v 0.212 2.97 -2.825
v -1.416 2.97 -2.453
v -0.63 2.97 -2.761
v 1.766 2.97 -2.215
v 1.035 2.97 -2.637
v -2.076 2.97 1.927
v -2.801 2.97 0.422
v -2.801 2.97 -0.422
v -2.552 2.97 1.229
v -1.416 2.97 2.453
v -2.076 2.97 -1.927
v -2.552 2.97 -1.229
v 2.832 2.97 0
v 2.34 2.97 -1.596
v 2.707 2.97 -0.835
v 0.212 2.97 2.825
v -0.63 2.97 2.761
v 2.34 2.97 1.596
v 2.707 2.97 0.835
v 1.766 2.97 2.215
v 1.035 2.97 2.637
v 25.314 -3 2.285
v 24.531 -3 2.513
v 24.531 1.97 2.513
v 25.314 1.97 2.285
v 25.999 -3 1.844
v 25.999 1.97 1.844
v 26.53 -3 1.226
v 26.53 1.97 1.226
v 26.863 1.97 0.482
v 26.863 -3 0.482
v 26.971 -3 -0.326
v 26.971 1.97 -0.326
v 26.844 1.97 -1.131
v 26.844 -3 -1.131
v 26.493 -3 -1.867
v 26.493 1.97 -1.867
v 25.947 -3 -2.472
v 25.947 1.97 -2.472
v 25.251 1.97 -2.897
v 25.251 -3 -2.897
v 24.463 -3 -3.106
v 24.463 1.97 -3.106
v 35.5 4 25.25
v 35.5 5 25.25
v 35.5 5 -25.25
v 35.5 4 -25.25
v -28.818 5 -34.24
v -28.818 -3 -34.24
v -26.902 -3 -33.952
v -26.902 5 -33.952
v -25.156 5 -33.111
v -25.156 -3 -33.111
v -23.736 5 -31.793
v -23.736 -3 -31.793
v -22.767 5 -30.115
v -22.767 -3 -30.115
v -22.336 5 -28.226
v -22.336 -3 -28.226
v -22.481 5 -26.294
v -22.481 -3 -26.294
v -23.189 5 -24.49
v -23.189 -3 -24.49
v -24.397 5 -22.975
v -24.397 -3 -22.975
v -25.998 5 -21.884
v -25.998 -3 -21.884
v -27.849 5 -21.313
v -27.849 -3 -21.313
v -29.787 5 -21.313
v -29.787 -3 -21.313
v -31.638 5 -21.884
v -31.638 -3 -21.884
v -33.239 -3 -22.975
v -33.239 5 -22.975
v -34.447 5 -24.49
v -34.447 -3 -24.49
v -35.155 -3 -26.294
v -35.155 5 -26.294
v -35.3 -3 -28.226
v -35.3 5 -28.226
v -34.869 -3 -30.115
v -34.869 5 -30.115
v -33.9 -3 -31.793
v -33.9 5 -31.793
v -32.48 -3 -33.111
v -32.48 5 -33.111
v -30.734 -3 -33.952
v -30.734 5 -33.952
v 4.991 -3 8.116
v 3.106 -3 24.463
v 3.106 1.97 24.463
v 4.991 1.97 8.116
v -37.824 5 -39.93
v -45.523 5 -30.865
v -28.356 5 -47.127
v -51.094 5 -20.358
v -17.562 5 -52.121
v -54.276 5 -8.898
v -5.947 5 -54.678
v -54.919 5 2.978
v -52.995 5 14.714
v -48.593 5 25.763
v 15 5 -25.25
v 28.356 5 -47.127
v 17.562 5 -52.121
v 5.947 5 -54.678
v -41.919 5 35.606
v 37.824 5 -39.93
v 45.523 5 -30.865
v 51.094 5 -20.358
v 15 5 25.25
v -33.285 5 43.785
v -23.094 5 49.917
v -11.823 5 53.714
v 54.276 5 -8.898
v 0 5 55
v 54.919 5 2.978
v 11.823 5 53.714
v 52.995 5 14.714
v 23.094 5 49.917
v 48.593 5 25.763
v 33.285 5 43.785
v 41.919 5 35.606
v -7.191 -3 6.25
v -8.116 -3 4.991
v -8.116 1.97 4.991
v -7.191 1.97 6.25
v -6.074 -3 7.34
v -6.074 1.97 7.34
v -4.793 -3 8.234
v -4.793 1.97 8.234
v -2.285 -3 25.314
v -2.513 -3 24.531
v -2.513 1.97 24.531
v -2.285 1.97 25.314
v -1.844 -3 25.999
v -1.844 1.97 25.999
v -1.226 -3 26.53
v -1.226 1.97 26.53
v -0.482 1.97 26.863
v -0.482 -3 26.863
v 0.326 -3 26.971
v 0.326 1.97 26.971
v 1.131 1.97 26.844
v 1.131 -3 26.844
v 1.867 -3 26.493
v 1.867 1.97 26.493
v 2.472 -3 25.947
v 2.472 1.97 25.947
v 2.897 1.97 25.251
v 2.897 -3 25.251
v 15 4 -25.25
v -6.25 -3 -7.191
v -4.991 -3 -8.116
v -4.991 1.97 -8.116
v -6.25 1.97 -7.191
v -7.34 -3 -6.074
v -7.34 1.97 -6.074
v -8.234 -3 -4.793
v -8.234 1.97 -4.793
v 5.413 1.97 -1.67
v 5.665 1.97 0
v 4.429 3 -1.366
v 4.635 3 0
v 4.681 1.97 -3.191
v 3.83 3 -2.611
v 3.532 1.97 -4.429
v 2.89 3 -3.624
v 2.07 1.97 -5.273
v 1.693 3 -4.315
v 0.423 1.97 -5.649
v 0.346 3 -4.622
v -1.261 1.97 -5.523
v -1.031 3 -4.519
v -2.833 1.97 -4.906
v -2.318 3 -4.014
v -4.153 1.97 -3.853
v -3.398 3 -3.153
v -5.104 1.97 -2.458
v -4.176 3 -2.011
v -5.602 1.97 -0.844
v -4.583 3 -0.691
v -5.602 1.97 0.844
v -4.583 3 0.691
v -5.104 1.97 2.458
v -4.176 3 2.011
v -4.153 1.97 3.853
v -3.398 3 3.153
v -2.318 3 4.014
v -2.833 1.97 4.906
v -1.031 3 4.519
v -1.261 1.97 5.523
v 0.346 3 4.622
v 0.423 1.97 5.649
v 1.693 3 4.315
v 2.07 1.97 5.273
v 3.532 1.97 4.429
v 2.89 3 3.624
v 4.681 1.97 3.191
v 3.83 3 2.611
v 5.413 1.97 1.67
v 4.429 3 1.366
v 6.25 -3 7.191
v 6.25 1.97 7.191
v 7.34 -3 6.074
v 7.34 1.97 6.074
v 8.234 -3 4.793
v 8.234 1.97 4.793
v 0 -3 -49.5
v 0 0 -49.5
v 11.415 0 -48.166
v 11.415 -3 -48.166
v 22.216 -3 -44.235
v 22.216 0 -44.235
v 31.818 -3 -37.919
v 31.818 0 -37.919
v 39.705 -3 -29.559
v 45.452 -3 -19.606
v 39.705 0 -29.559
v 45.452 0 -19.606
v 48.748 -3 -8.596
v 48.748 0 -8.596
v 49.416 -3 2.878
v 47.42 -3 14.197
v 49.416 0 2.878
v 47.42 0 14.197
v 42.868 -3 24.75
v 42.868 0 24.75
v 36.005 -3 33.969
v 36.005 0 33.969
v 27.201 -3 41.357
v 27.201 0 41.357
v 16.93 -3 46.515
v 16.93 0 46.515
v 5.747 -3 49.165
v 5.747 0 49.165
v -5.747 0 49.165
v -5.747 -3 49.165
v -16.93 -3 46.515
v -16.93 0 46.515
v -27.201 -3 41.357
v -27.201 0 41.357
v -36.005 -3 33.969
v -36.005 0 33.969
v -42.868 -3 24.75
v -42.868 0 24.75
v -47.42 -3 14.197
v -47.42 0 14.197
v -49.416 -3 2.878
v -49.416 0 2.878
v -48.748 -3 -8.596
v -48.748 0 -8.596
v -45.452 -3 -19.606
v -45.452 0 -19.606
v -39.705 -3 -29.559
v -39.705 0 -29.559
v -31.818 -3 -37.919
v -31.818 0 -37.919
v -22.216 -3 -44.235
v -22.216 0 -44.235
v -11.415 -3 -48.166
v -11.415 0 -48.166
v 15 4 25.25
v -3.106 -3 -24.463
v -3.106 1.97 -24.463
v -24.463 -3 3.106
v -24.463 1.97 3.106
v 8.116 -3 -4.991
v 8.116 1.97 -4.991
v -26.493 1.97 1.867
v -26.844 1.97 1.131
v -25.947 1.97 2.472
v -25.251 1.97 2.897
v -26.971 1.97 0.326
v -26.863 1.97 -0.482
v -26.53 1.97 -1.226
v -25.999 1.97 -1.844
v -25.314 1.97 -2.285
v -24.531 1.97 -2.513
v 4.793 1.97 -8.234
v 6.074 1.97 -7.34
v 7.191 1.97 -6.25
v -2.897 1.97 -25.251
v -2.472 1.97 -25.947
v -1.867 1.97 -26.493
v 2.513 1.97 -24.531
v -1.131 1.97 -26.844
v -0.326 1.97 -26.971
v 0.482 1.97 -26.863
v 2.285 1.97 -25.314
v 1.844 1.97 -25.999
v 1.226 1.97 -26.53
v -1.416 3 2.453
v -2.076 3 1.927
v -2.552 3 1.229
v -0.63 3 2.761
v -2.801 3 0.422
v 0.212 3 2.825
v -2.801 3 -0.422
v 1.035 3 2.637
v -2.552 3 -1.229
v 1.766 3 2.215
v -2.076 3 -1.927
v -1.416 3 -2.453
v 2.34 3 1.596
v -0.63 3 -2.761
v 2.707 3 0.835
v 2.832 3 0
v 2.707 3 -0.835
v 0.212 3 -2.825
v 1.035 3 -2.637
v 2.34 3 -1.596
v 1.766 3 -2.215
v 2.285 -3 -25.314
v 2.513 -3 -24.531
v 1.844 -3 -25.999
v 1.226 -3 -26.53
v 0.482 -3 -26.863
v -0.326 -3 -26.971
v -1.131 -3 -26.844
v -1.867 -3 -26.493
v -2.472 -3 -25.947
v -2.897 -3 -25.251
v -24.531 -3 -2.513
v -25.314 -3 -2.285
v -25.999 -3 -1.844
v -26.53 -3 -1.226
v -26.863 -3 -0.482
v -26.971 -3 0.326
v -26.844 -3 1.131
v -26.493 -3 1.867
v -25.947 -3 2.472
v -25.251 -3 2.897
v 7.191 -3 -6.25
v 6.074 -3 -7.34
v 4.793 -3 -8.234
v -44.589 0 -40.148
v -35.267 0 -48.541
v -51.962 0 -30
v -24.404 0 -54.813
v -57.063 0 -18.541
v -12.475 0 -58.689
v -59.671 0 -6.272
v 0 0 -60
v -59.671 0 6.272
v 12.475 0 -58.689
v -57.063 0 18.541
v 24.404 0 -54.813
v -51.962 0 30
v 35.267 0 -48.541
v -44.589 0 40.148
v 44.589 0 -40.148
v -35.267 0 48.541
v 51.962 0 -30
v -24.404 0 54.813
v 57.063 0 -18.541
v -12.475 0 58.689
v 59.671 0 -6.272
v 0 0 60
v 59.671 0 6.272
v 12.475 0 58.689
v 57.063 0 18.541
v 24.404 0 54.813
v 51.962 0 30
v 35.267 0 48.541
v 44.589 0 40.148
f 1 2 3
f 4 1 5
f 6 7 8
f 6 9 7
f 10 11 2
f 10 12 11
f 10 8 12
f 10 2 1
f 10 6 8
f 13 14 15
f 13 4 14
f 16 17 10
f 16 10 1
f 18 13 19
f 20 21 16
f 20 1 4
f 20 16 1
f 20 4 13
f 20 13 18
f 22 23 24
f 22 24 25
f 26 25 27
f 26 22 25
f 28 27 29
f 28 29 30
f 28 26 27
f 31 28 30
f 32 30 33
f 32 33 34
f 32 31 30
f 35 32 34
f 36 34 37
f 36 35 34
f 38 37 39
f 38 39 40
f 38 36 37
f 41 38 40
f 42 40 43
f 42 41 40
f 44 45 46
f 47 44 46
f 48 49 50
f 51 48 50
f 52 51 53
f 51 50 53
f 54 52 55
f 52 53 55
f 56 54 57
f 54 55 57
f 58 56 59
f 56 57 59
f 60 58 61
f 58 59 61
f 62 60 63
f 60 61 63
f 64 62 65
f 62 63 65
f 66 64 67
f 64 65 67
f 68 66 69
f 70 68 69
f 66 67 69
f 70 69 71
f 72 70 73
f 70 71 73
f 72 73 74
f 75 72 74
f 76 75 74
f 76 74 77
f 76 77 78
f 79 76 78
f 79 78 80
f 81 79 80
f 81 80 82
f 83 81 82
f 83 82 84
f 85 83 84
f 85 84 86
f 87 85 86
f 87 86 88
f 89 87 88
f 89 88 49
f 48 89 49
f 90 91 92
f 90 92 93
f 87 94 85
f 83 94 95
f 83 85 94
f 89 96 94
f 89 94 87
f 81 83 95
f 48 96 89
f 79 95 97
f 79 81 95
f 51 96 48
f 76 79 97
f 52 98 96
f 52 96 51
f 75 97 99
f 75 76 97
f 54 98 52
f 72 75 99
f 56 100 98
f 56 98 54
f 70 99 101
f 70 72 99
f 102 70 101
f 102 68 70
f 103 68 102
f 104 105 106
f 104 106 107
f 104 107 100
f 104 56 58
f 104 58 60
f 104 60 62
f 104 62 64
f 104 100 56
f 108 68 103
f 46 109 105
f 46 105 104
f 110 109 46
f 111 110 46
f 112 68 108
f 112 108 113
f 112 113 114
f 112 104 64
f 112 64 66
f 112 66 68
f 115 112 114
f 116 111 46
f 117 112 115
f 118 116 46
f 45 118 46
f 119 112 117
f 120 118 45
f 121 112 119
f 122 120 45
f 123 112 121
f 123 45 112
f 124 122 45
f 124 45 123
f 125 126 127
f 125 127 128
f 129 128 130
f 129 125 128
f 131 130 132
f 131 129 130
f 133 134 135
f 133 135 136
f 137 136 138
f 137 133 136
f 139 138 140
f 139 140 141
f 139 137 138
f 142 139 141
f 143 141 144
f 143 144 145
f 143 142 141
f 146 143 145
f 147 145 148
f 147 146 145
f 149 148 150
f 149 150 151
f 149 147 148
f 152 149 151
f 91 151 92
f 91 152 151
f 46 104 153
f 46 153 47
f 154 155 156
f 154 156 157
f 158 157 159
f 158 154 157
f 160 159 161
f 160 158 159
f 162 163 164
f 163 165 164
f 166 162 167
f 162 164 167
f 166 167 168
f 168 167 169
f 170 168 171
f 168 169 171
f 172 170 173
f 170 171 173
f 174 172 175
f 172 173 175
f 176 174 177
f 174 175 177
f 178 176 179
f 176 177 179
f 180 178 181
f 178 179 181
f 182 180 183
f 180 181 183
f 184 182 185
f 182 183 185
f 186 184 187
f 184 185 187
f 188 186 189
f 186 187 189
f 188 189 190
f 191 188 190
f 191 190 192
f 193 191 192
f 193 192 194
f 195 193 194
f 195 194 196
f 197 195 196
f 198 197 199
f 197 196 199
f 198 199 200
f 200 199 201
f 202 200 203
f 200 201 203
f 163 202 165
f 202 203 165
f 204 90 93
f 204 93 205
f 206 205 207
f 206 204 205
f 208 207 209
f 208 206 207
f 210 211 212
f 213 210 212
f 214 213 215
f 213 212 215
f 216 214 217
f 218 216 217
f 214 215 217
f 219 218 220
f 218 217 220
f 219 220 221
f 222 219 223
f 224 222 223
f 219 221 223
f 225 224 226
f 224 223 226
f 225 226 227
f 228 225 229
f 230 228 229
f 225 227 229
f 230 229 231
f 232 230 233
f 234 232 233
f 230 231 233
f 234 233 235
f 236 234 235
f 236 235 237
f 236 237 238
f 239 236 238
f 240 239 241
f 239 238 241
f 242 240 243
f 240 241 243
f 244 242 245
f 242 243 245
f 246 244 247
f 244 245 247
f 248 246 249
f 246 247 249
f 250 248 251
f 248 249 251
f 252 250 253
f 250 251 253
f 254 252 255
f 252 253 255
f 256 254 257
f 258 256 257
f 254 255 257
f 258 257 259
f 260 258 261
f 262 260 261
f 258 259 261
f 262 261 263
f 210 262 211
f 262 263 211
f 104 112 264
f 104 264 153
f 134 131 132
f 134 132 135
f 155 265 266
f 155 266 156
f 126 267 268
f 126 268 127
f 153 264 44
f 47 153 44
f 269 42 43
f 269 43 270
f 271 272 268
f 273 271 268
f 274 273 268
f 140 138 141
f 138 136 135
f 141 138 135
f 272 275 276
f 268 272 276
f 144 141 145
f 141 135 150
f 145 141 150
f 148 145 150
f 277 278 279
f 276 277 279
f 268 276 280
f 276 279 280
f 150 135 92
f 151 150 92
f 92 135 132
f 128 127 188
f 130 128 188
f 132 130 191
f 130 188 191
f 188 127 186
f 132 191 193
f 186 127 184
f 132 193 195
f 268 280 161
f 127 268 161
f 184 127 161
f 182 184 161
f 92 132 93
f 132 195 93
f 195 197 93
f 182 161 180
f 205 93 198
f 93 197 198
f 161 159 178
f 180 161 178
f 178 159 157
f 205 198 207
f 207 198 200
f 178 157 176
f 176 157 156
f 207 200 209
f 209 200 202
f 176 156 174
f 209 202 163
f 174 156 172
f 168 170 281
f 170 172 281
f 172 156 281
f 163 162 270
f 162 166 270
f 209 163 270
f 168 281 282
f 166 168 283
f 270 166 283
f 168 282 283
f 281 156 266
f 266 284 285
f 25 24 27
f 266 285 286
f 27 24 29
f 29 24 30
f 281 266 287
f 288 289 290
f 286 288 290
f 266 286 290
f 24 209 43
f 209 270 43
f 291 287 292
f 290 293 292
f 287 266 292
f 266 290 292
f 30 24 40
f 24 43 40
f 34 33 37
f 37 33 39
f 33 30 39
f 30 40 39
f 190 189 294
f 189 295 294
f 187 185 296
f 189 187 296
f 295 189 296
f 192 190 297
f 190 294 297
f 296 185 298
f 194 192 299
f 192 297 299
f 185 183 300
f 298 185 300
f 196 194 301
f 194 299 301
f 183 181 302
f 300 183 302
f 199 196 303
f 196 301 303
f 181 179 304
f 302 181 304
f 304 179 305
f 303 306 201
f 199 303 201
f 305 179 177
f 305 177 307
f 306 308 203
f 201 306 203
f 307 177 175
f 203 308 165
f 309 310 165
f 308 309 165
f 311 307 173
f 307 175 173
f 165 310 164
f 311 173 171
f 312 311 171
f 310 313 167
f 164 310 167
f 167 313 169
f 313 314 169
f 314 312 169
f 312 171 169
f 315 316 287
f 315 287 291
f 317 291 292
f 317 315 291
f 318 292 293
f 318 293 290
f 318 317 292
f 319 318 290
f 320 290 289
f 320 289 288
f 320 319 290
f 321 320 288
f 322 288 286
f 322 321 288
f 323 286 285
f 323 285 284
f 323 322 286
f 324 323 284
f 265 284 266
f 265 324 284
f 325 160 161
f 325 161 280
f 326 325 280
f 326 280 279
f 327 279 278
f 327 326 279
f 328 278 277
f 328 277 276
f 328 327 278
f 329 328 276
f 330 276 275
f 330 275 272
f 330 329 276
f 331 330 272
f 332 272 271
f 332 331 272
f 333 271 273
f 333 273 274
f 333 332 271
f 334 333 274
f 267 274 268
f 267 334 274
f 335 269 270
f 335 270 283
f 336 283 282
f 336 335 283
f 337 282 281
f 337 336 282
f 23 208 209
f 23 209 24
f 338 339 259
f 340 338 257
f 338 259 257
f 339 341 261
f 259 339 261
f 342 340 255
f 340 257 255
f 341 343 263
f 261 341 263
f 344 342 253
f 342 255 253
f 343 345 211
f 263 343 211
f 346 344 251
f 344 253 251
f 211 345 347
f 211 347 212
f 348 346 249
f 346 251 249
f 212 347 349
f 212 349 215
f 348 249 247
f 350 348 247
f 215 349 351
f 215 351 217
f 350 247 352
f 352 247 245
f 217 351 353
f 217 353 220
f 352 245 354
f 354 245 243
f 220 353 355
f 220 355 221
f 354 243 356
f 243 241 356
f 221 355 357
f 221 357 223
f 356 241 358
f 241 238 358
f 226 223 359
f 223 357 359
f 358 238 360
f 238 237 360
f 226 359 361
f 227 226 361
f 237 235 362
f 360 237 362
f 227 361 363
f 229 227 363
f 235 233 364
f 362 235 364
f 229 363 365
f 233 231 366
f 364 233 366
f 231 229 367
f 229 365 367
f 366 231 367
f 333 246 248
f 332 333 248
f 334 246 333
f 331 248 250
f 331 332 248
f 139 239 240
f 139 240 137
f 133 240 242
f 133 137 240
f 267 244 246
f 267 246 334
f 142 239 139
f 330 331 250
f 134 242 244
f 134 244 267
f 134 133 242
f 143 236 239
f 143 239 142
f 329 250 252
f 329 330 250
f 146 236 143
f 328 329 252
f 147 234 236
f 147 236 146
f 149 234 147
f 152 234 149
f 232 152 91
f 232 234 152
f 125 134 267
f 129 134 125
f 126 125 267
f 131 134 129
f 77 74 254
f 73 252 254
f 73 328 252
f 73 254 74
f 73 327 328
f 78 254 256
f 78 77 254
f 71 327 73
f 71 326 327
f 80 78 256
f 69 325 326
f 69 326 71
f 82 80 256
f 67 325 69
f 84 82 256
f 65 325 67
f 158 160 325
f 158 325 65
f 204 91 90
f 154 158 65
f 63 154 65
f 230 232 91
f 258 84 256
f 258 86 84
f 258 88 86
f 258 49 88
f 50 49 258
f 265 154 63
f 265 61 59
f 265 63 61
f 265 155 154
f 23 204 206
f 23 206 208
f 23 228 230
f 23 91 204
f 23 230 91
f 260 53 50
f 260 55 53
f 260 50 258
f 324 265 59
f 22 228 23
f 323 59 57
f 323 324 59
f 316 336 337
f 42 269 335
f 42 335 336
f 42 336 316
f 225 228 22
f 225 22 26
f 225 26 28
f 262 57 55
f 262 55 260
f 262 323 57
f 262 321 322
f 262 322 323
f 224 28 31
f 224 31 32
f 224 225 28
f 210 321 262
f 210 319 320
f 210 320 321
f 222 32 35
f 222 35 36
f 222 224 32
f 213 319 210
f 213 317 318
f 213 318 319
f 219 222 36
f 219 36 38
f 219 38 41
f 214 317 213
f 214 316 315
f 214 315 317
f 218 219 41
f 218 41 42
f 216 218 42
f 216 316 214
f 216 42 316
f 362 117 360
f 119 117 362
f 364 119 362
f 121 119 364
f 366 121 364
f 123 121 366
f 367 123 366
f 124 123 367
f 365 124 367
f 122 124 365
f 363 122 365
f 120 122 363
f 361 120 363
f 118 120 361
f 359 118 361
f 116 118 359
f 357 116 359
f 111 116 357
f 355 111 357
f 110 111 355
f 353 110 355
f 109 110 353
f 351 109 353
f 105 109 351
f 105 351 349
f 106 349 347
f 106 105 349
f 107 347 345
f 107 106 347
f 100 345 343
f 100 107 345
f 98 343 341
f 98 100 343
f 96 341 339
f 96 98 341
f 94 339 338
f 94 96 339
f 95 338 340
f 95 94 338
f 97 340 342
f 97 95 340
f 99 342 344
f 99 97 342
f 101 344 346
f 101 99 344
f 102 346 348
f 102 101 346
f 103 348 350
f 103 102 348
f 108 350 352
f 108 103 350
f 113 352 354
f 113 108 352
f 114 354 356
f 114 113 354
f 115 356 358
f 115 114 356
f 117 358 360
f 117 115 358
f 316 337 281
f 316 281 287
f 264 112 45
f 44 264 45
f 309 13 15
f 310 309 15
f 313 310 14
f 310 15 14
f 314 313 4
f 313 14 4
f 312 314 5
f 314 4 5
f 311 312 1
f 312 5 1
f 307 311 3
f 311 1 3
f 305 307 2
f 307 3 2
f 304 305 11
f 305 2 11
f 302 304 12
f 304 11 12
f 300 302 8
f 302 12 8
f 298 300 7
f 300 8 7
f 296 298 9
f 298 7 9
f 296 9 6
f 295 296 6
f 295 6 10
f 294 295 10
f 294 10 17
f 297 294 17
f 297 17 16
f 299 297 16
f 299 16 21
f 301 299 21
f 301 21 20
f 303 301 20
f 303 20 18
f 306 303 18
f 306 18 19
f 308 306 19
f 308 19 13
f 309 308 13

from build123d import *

# Parameters (mm, degrees)
SKETCH1_R           = 60
BOSS_EXTRUDE1_DEPTH = 5
SKETCH2_R           = 49.5
BOSS_EXTRUDE2_DEPTH = 3
CHAMFER1_SIZE       = 5
CAVITY3_START       = -3
CAVITY3_OUTLINE_R   = 1.03
CAVITY3_DEPTH       = 4.97
CAVITY3_START_2     = -0.09
CAVITY3_2_OUTLINE_R = 1.6995
CAVITY3_2_DEPTH     = 2.06
CAVITY3_START_3     = 1.97
CAVITY3_3_OUTLINE_R = 2.8325
CAVITY3_3_DEPTH     = 1.03
SKETCH3_R           = 1.03
SKETCH3_R_2         = 4.12
CUT_EXTRUDE1_DEPTH  = 4.97
SKETCH4_R           = 2.8325
CUT_EXTRUDE2_DEPTH  = 1
SKETCH5_W           = 20.5
SKETCH5_H           = 50.5
CUT_EXTRUDE3_DEPTH  = 1
SKETCH6_R           = 6.5
CUT_EXTRUDE4_DEPTH  = 86.229103011


with BuildPart() as part:
    # Sketch1 → Boss-Extrude1 (new body)
    with BuildSketch(Plane(origin=(0, 0, 0), x_dir=(1, 0, 0), z_dir=(0, 1, 0))):
        with Locations(Location((0, 0, 0), (0, 0, 270))):
            Circle(SKETCH1_R)
    extrude(amount=BOSS_EXTRUDE1_DEPTH)

    # Sketch2 → Boss-Extrude2 (add)
    with BuildSketch(Plane.XZ):
        with Locations(Location((0, 0, 0), (0, 0, 270))):
            Circle(SKETCH2_R)
    extrude(amount=BOSS_EXTRUDE2_DEPTH)

    # Chamfer1
    chamfer1_edges = [part.edges().sort_by_distance(p)[0] for p in [
        (0, 5, -60),
    ]]
    chamfer(chamfer1_edges, length=CHAMFER1_SIZE - 0.0001)  # a hair under: the kernel refuses the full size

    # Cavity3: read off the stored shape, not the designer's step
    # Cavity3 outline → Cavity3 (cut)
    with BuildSketch(Plane(origin=(0, 0, 0), x_dir=(1, 0, 0), z_dir=(0, 1, 0)).offset(CAVITY3_START)):
        with BuildLine():
            Line((24.463108255, 3.105757511), (8.115613404, 4.990999431))
            ThreePointArc((8.115613404, 4.990999431), (6.655003546, 6.817931068), (4.793285171, 8.233934267))
            Line((4.793285171, 8.233934267), (2.513273505, 24.531058916))
            ThreePointArc((2.513273505, 24.531058916), (-0.326157735, 26.970899519), (-3.105757511, 24.463108255))
            Line((-3.105757511, 24.463108255), (-4.990999431, 8.115613404))
            ThreePointArc((-4.990999431, 8.115613404), (-6.817931068, 6.655003546), (-8.233934267, 4.793285171))
            Line((-8.233934267, 4.793285171), (-24.531058916, 2.513273505))
            ThreePointArc((-24.531058916, 2.513273505), (-26.970899519, -0.326157735), (-24.463108255, -3.105757511))
            Line((-24.463108255, -3.105757511), (-8.115613404, -4.990999431))
            ThreePointArc((-8.115613404, -4.990999431), (-6.655003546, -6.817931068), (-4.793285171, -8.233934267))
            Line((-4.793285171, -8.233934267), (-2.513273505, -24.531058916))
            ThreePointArc((-2.513273505, -24.531058916), (0.326157735, -26.970899519), (3.105757511, -24.463108255))
            Line((3.105757511, -24.463108255), (4.990999431, -8.115613404))
            ThreePointArc((4.990999431, -8.115613404), (6.817931068, -6.655003546), (8.233934267, -4.793285171))
            Line((8.233934267, -4.793285171), (24.531058916, -2.513273505))
            ThreePointArc((24.531058916, -2.513273505), (26.970899519, 0.326157735), (24.463108255, 3.105757511))
        make_face()
        with Locations((-23.945749158, -0.289574743)):
            Circle(CAVITY3_OUTLINE_R, mode=Mode.SUBTRACT)
        with Locations((-18.796125683, -0.227300605)):
            Circle(CAVITY3_OUTLINE_R, mode=Mode.SUBTRACT)
        with Locations((-13.646502208, -0.165026467)):
            Circle(CAVITY3_OUTLINE_R, mode=Mode.SUBTRACT)
        with Locations((-8.496878733, -0.102752328)):
            Circle(CAVITY3_OUTLINE_R, mode=Mode.SUBTRACT)
        with BuildLine():
            Line((3.503478055, -0.1010505), (4.112023478, -0.256247761))
            ThreePointArc((4.112023478, -0.256247761), (4.090956911, -0.488335495), (4.056801586, -0.718860831))
            Line((4.056801586, -0.718860831), (3.428823838, -0.726454935))
            Line((3.428823838, -0.726454935), (3.357946141, -1.004374133))
            Line((3.357946141, -1.004374133), (3.905587875, -1.31178632))
            ThreePointArc((3.905587875, -1.31178632), (3.825170408, -1.530513428), (3.73251455, -1.744343755))
            Line((3.73251455, -1.744343755), (3.123969126, -1.589146495))
            Line((3.123969126, -1.589146495), (2.983575747, -1.839251328))
            Line((2.983575747, -1.839251328), (3.432992913, -2.27792881))
            ThreePointArc((3.432992913, -2.27792881), (3.298704863, -2.4683894), (3.153862816, -2.650952535))
            Line((3.153862816, -2.650952535), (2.606221081, -2.343540347))
            Line((2.606221081, -2.343540347), (2.405879596, -2.548786584))
            Line((2.405879596, -2.548786584), (2.726445157, -3.088834215))
            ThreePointArc((2.726445157, -3.088834215), (2.547438033, -3.238048713), (2.360280543, -3.37690328))
            Line((2.360280543, -3.37690328), (1.910863377, -2.938225798))
            Line((1.910863377, -2.938225798), (1.664226727, -3.084626247))
            Line((1.664226727, -3.084626247), (1.834094669, -3.689240673))
            ThreePointArc((1.834094669, -3.689240673), (1.622567511, -3.787040358), (1.405849051, -3.872723647))
            Line((1.405849051, -3.872723647), (1.085283491, -3.332676016))
            Line((1.085283491, -3.332676016), (0.809159557, -3.410253729))
            Line((0.809159557, -3.410253729), (0.81675366, -4.038231477))
            ThreePointArc((0.81675366, -4.038231477), (0.587121694, -4.077951461), (0.35561127, -4.104624298))
            Line((0.35561127, -4.104624298), (0.185743328, -3.500009871))
            Line((0.185743328, -3.500009871), (-0.1010505, -3.503478055))
            Line((-0.1010505, -3.503478055), (-0.256247761, -4.112023478))
            ThreePointArc((-0.256247761, -4.112023478), (-0.488335495, -4.090956911), (-0.718860831, -4.056801586))
            Line((-0.718860831, -4.056801586), (-0.726454935, -3.428823838))
            Line((-0.726454935, -3.428823838), (-1.004374133, -3.357946141))
            Line((-1.004374133, -3.357946141), (-1.31178632, -3.905587875))
            ThreePointArc((-1.31178632, -3.905587875), (-1.530513428, -3.825170408), (-1.744343755, -3.73251455))
            Line((-1.744343755, -3.73251455), (-1.589146495, -3.123969126))
            Line((-1.589146495, -3.123969126), (-1.839251328, -2.983575747))
            Line((-1.839251328, -2.983575747), (-2.27792881, -3.432992913))
            ThreePointArc((-2.27792881, -3.432992913), (-2.4683894, -3.298704863), (-2.650952535, -3.153862816))
            Line((-2.650952535, -3.153862816), (-2.343540347, -2.606221081))
            Line((-2.343540347, -2.606221081), (-2.548786584, -2.405879596))
            Line((-2.548786584, -2.405879596), (-3.088834215, -2.726445157))
            ThreePointArc((-3.088834215, -2.726445157), (-3.238048713, -2.547438033), (-3.37690328, -2.360280543))
            Line((-3.37690328, -2.360280543), (-2.938225798, -1.910863377))
            Line((-2.938225798, -1.910863377), (-3.084626247, -1.664226727))
            Line((-3.084626247, -1.664226727), (-3.689240673, -1.834094669))
            ThreePointArc((-3.689240673, -1.834094669), (-3.787040358, -1.622567511), (-3.872723647, -1.405849051))
            Line((-3.872723647, -1.405849051), (-3.332676016, -1.085283491))
            Line((-3.332676016, -1.085283491), (-3.410253729, -0.809159557))
            Line((-3.410253729, -0.809159557), (-4.038231477, -0.81675366))
            ThreePointArc((-4.038231477, -0.81675366), (-4.077951461, -0.587121694), (-4.104624298, -0.35561127))
            Line((-4.104624298, -0.35561127), (-3.500009871, -0.185743328))
            Line((-3.500009871, -0.185743328), (-3.503478055, 0.1010505))
            Line((-3.503478055, 0.1010505), (-4.112023478, 0.256247761))
            ThreePointArc((-4.112023478, 0.256247761), (-4.090956911, 0.488335495), (-4.056801586, 0.718860831))
            Line((-4.056801586, 0.718860831), (-3.428823838, 0.726454935))
            Line((-3.428823838, 0.726454935), (-3.357946141, 1.004374133))
            Line((-3.357946141, 1.004374133), (-3.905587875, 1.31178632))
            ThreePointArc((-3.905587875, 1.31178632), (-3.825170408, 1.530513428), (-3.73251455, 1.744343755))
            Line((-3.73251455, 1.744343755), (-3.123969126, 1.589146495))
            Line((-3.123969126, 1.589146495), (-2.983575747, 1.839251328))
            Line((-2.983575747, 1.839251328), (-3.432992913, 2.27792881))
            ThreePointArc((-3.432992913, 2.27792881), (-3.298704863, 2.4683894), (-3.153862816, 2.650952535))
            Line((-3.153862816, 2.650952535), (-2.606221081, 2.343540347))
            Line((-2.606221081, 2.343540347), (-2.405879596, 2.548786584))
            Line((-2.405879596, 2.548786584), (-2.726445157, 3.088834215))
            ThreePointArc((-2.726445157, 3.088834215), (-2.547438033, 3.238048713), (-2.360280543, 3.37690328))
            Line((-2.360280543, 3.37690328), (-1.910863377, 2.938225798))
            Line((-1.910863377, 2.938225798), (-1.664226727, 3.084626247))
            Line((-1.664226727, 3.084626247), (-1.834094669, 3.689240673))
            ThreePointArc((-1.834094669, 3.689240673), (-1.622567511, 3.787040358), (-1.405849051, 3.872723647))
            Line((-1.405849051, 3.872723647), (-1.085283491, 3.332676016))
            Line((-1.085283491, 3.332676016), (-0.809159557, 3.410253729))
            Line((-0.809159557, 3.410253729), (-0.81675366, 4.038231477))
            ThreePointArc((-0.81675366, 4.038231477), (-0.587121694, 4.077951461), (-0.35561127, 4.104624298))
            Line((-0.35561127, 4.104624298), (-0.185743328, 3.500009871))
            Line((-0.185743328, 3.500009871), (0.1010505, 3.503478055))
            Line((0.1010505, 3.503478055), (0.256247761, 4.112023478))
            ThreePointArc((0.256247761, 4.112023478), (0.488335495, 4.090956911), (0.718860831, 4.056801586))
            Line((0.718860831, 4.056801586), (0.726454935, 3.428823838))
            Line((0.726454935, 3.428823838), (1.004374133, 3.357946141))
            Line((1.004374133, 3.357946141), (1.31178632, 3.905587875))
            ThreePointArc((1.31178632, 3.905587875), (1.530513428, 3.825170408), (1.744343755, 3.73251455))
            Line((1.744343755, 3.73251455), (1.589146495, 3.123969126))
            Line((1.589146495, 3.123969126), (1.839251328, 2.983575747))
            Line((1.839251328, 2.983575747), (2.27792881, 3.432992913))
            ThreePointArc((2.27792881, 3.432992913), (2.4683894, 3.298704863), (2.650952535, 3.153862816))
            Line((2.650952535, 3.153862816), (2.343540347, 2.606221081))
            Line((2.343540347, 2.606221081), (2.548786584, 2.405879596))
            Line((2.548786584, 2.405879596), (3.088834215, 2.726445157))
            ThreePointArc((3.088834215, 2.726445157), (3.238048713, 2.547438033), (3.37690328, 2.360280543))
            Line((3.37690328, 2.360280543), (2.938225798, 1.910863377))
            Line((2.938225798, 1.910863377), (3.084626247, 1.664226727))
            Line((3.084626247, 1.664226727), (3.689240673, 1.834094669))
            ThreePointArc((3.689240673, 1.834094669), (3.787040358, 1.622567511), (3.872723647, 1.405849051))
            Line((3.872723647, 1.405849051), (3.332676016, 1.085283491))
            Line((3.332676016, 1.085283491), (3.410253729, 0.809159557))
            Line((3.410253729, 0.809159557), (4.038231477, 0.81675366))
            ThreePointArc((4.038231477, 0.81675366), (4.077951461, 0.587121694), (4.104624298, 0.35561127))
            Line((4.104624298, 0.35561127), (3.500009871, 0.185743328))
            Line((3.500009871, 0.185743328), (3.503478055, -0.1010505))
        make_face(mode=Mode.SUBTRACT)
        with Locations((0.289574743, -23.945749158)):
            Circle(CAVITY3_OUTLINE_R, mode=Mode.SUBTRACT)
        with Locations((0.227300605, -18.796125683)):
            Circle(CAVITY3_OUTLINE_R, mode=Mode.SUBTRACT)
        with Locations((0.165026467, -13.646502208)):
            Circle(CAVITY3_OUTLINE_R, mode=Mode.SUBTRACT)
        with Locations((0.102752328, -8.496878733)):
            Circle(CAVITY3_OUTLINE_R, mode=Mode.SUBTRACT)
        with Locations((-0.102752328, 8.496878733)):
            Circle(CAVITY3_OUTLINE_R, mode=Mode.SUBTRACT)
        with Locations((-0.165026467, 13.646502208)):
            Circle(CAVITY3_OUTLINE_R, mode=Mode.SUBTRACT)
        with Locations((-0.227300605, 18.796125683)):
            Circle(CAVITY3_OUTLINE_R, mode=Mode.SUBTRACT)
        with Locations((-0.289574743, 23.945749158)):
            Circle(CAVITY3_OUTLINE_R, mode=Mode.SUBTRACT)
        with Locations((8.496878733, 0.102752328)):
            Circle(CAVITY3_OUTLINE_R, mode=Mode.SUBTRACT)
        with Locations((13.646502208, 0.165026467)):
            Circle(CAVITY3_OUTLINE_R, mode=Mode.SUBTRACT)
        with Locations((18.796125683, 0.227300605)):
            Circle(CAVITY3_OUTLINE_R, mode=Mode.SUBTRACT)
        with Locations((23.945749158, 0.289574743)):
            Circle(CAVITY3_OUTLINE_R, mode=Mode.SUBTRACT)
    extrude(amount=CAVITY3_DEPTH, mode=Mode.SUBTRACT)

    # Cavity3 2 outline → Cavity3 2 (cut)
    with BuildSketch(Plane(origin=(0, 0, 0), x_dir=(1, 0, 0), z_dir=(0, 1, 0)).offset(CAVITY3_START_2)):
        with BuildLine():
            ThreePointArc((4.056801586, -0.718860831), (4.090956911, -0.488335495), (4.112023478, -0.256247761))
            Line((4.112023478, -0.256247761), (3.503478055, -0.1010505))
            Line((3.503478055, -0.1010505), (3.500009871, 0.185743328))
            Line((3.500009871, 0.185743328), (4.104624298, 0.35561127))
            ThreePointArc((4.104624298, 0.35561127), (4.077951461, 0.587121694), (4.038231477, 0.81675366))
            Line((4.038231477, 0.81675366), (3.410253729, 0.809159557))
            Line((3.410253729, 0.809159557), (3.332676016, 1.085283491))
            Line((3.332676016, 1.085283491), (3.872723647, 1.405849051))
            ThreePointArc((3.872723647, 1.405849051), (3.787040358, 1.622567511), (3.689240673, 1.834094669))
            Line((3.689240673, 1.834094669), (3.084626247, 1.664226727))
            Line((3.084626247, 1.664226727), (2.938225798, 1.910863377))
            Line((2.938225798, 1.910863377), (3.37690328, 2.360280543))
            ThreePointArc((3.37690328, 2.360280543), (3.238048713, 2.547438033), (3.088834215, 2.726445157))
            Line((3.088834215, 2.726445157), (2.548786584, 2.405879596))
            Line((2.548786584, 2.405879596), (2.343540347, 2.606221081))
            Line((2.343540347, 2.606221081), (2.650952535, 3.153862816))
            ThreePointArc((2.650952535, 3.153862816), (2.4683894, 3.298704863), (2.27792881, 3.432992913))
            Line((2.27792881, 3.432992913), (1.839251328, 2.983575747))
            Line((1.839251328, 2.983575747), (1.589146495, 3.123969126))
            Line((1.589146495, 3.123969126), (1.744343755, 3.73251455))
            ThreePointArc((1.744343755, 3.73251455), (1.530513428, 3.825170408), (1.31178632, 3.905587875))
            Line((1.31178632, 3.905587875), (1.004374133, 3.357946141))
            Line((1.004374133, 3.357946141), (0.726454935, 3.428823838))
            Line((0.726454935, 3.428823838), (0.718860831, 4.056801586))
            ThreePointArc((0.718860831, 4.056801586), (0.488335495, 4.090956911), (0.256247761, 4.112023478))
            Line((0.256247761, 4.112023478), (0.1010505, 3.503478055))
            Line((0.1010505, 3.503478055), (-0.185743328, 3.500009871))
            Line((-0.185743328, 3.500009871), (-0.35561127, 4.104624298))
            ThreePointArc((-0.35561127, 4.104624298), (-0.587121694, 4.077951461), (-0.81675366, 4.038231477))
            Line((-0.81675366, 4.038231477), (-0.809159557, 3.410253729))
            Line((-0.809159557, 3.410253729), (-1.085283491, 3.332676016))
            Line((-1.085283491, 3.332676016), (-1.405849051, 3.872723647))
            ThreePointArc((-1.405849051, 3.872723647), (-1.622567511, 3.787040358), (-1.834094669, 3.689240673))
            Line((-1.834094669, 3.689240673), (-1.664226727, 3.084626247))
            Line((-1.664226727, 3.084626247), (-1.910863377, 2.938225798))
            Line((-1.910863377, 2.938225798), (-2.360280543, 3.37690328))
            ThreePointArc((-2.360280543, 3.37690328), (-2.547438033, 3.238048713), (-2.726445157, 3.088834215))
            Line((-2.726445157, 3.088834215), (-2.405879596, 2.548786584))
            Line((-2.405879596, 2.548786584), (-2.606221081, 2.343540347))
            Line((-2.606221081, 2.343540347), (-3.153862816, 2.650952535))
            ThreePointArc((-3.153862816, 2.650952535), (-3.298704863, 2.4683894), (-3.432992913, 2.27792881))
            Line((-3.432992913, 2.27792881), (-2.983575747, 1.839251328))
            Line((-2.983575747, 1.839251328), (-3.123969126, 1.589146495))
            Line((-3.123969126, 1.589146495), (-3.73251455, 1.744343755))
            ThreePointArc((-3.73251455, 1.744343755), (-3.825170408, 1.530513428), (-3.905587875, 1.31178632))
            Line((-3.905587875, 1.31178632), (-3.357946141, 1.004374133))
            Line((-3.357946141, 1.004374133), (-3.428823838, 0.726454935))
            Line((-3.428823838, 0.726454935), (-4.056801586, 0.718860831))
            ThreePointArc((-4.056801586, 0.718860831), (-4.090956911, 0.488335495), (-4.112023478, 0.256247761))
            Line((-4.112023478, 0.256247761), (-3.503478055, 0.1010505))
            Line((-3.503478055, 0.1010505), (-3.500009871, -0.185743328))
            Line((-3.500009871, -0.185743328), (-4.104624298, -0.35561127))
            ThreePointArc((-4.104624298, -0.35561127), (-4.077951461, -0.587121694), (-4.038231477, -0.81675366))
            Line((-4.038231477, -0.81675366), (-3.410253729, -0.809159557))
            Line((-3.410253729, -0.809159557), (-3.332676016, -1.085283491))
            Line((-3.332676016, -1.085283491), (-3.872723647, -1.405849051))
            ThreePointArc((-3.872723647, -1.405849051), (-3.787040358, -1.622567511), (-3.689240673, -1.834094669))
            Line((-3.689240673, -1.834094669), (-3.084626247, -1.664226727))
            Line((-3.084626247, -1.664226727), (-2.938225798, -1.910863377))
            Line((-2.938225798, -1.910863377), (-3.37690328, -2.360280543))
            ThreePointArc((-3.37690328, -2.360280543), (-3.238048713, -2.547438033), (-3.088834215, -2.726445157))
            Line((-3.088834215, -2.726445157), (-2.548786584, -2.405879596))
            Line((-2.548786584, -2.405879596), (-2.343540347, -2.606221081))
            Line((-2.343540347, -2.606221081), (-2.650952535, -3.153862816))
            ThreePointArc((-2.650952535, -3.153862816), (-2.4683894, -3.298704863), (-2.27792881, -3.432992913))
            Line((-2.27792881, -3.432992913), (-1.839251328, -2.983575747))
            Line((-1.839251328, -2.983575747), (-1.589146495, -3.123969126))
            Line((-1.589146495, -3.123969126), (-1.744343755, -3.73251455))
            ThreePointArc((-1.744343755, -3.73251455), (-1.530513428, -3.825170408), (-1.31178632, -3.905587875))
            Line((-1.31178632, -3.905587875), (-1.004374133, -3.357946141))
            Line((-1.004374133, -3.357946141), (-0.726454935, -3.428823838))
            Line((-0.726454935, -3.428823838), (-0.718860831, -4.056801586))
            ThreePointArc((-0.718860831, -4.056801586), (-0.488335495, -4.090956911), (-0.256247761, -4.112023478))
            Line((-0.256247761, -4.112023478), (-0.1010505, -3.503478055))
            Line((-0.1010505, -3.503478055), (0.185743328, -3.500009871))
            Line((0.185743328, -3.500009871), (0.35561127, -4.104624298))
            ThreePointArc((0.35561127, -4.104624298), (0.587121694, -4.077951461), (0.81675366, -4.038231477))
            Line((0.81675366, -4.038231477), (0.809159557, -3.410253729))
            Line((0.809159557, -3.410253729), (1.085283491, -3.332676016))
            Line((1.085283491, -3.332676016), (1.405849051, -3.872723647))
            ThreePointArc((1.405849051, -3.872723647), (1.622567511, -3.787040358), (1.834094669, -3.689240673))
            Line((1.834094669, -3.689240673), (1.664226727, -3.084626247))
            Line((1.664226727, -3.084626247), (1.910863377, -2.938225798))
            Line((1.910863377, -2.938225798), (2.360280543, -3.37690328))
            ThreePointArc((2.360280543, -3.37690328), (2.547438033, -3.238048713), (2.726445157, -3.088834215))
            Line((2.726445157, -3.088834215), (2.405879596, -2.548786584))
            Line((2.405879596, -2.548786584), (2.606221081, -2.343540347))
            Line((2.606221081, -2.343540347), (3.153862816, -2.650952535))
            ThreePointArc((3.153862816, -2.650952535), (3.298704863, -2.4683894), (3.432992913, -2.27792881))
            Line((3.432992913, -2.27792881), (2.983575747, -1.839251328))
            Line((2.983575747, -1.839251328), (3.123969126, -1.589146495))
            Line((3.123969126, -1.589146495), (3.73251455, -1.744343755))
            ThreePointArc((3.73251455, -1.744343755), (3.825170408, -1.530513428), (3.905587875, -1.31178632))
            Line((3.905587875, -1.31178632), (3.357946141, -1.004374133))
            Line((3.357946141, -1.004374133), (3.428823838, -0.726454935))
            Line((3.428823838, -0.726454935), (4.056801586, -0.718860831))
        make_face()
        Circle(CAVITY3_2_OUTLINE_R, mode=Mode.SUBTRACT)
    extrude(amount=CAVITY3_2_DEPTH, mode=Mode.SUBTRACT)

    # Cavity3 3 outline → Cavity3 3 (cut)
    with BuildSketch(Plane(origin=(0, 0, 0), x_dir=(1, 0, 0), z_dir=(0, 1, 0)).offset(CAVITY3_START_3)):
        with BuildLine():
            ThreePointArc((4.056801586, -0.718860831), (4.090956911, -0.488335495), (4.112023478, -0.256247761))
            Line((4.112023478, -0.256247761), (3.503478055, -0.1010505))
            Line((3.503478055, -0.1010505), (3.500009871, 0.185743328))
            Line((3.500009871, 0.185743328), (4.104624298, 0.35561127))
            ThreePointArc((4.104624298, 0.35561127), (4.077951461, 0.587121694), (4.038231477, 0.81675366))
            Line((4.038231477, 0.81675366), (3.410253729, 0.809159557))
            Line((3.410253729, 0.809159557), (3.332676016, 1.085283491))
            Line((3.332676016, 1.085283491), (3.872723647, 1.405849051))
            ThreePointArc((3.872723647, 1.405849051), (3.787040358, 1.622567511), (3.689240673, 1.834094669))
            Line((3.689240673, 1.834094669), (3.084626247, 1.664226727))
            Line((3.084626247, 1.664226727), (2.938225798, 1.910863377))
            Line((2.938225798, 1.910863377), (3.37690328, 2.360280543))
            ThreePointArc((3.37690328, 2.360280543), (3.238048713, 2.547438033), (3.088834215, 2.726445157))
            Line((3.088834215, 2.726445157), (2.548786584, 2.405879596))
            Line((2.548786584, 2.405879596), (2.343540347, 2.606221081))
            Line((2.343540347, 2.606221081), (2.650952535, 3.153862816))
            ThreePointArc((2.650952535, 3.153862816), (2.4683894, 3.298704863), (2.27792881, 3.432992913))
            Line((2.27792881, 3.432992913), (1.839251328, 2.983575747))
            Line((1.839251328, 2.983575747), (1.589146495, 3.123969126))
            Line((1.589146495, 3.123969126), (1.744343755, 3.73251455))
            ThreePointArc((1.744343755, 3.73251455), (1.530513428, 3.825170408), (1.31178632, 3.905587875))
            Line((1.31178632, 3.905587875), (1.004374133, 3.357946141))
            Line((1.004374133, 3.357946141), (0.726454935, 3.428823838))
            Line((0.726454935, 3.428823838), (0.718860831, 4.056801586))
            ThreePointArc((0.718860831, 4.056801586), (0.488335495, 4.090956911), (0.256247761, 4.112023478))
            Line((0.256247761, 4.112023478), (0.1010505, 3.503478055))
            Line((0.1010505, 3.503478055), (-0.185743328, 3.500009871))
            Line((-0.185743328, 3.500009871), (-0.35561127, 4.104624298))
            ThreePointArc((-0.35561127, 4.104624298), (-0.587121694, 4.077951461), (-0.81675366, 4.038231477))
            Line((-0.81675366, 4.038231477), (-0.809159557, 3.410253729))
            Line((-0.809159557, 3.410253729), (-1.085283491, 3.332676016))
            Line((-1.085283491, 3.332676016), (-1.405849051, 3.872723647))
            ThreePointArc((-1.405849051, 3.872723647), (-1.622567511, 3.787040358), (-1.834094669, 3.689240673))
            Line((-1.834094669, 3.689240673), (-1.664226727, 3.084626247))
            Line((-1.664226727, 3.084626247), (-1.910863377, 2.938225798))
            Line((-1.910863377, 2.938225798), (-2.360280543, 3.37690328))
            ThreePointArc((-2.360280543, 3.37690328), (-2.547438033, 3.238048713), (-2.726445157, 3.088834215))
            Line((-2.726445157, 3.088834215), (-2.405879596, 2.548786584))
            Line((-2.405879596, 2.548786584), (-2.606221081, 2.343540347))
            Line((-2.606221081, 2.343540347), (-3.153862816, 2.650952535))
            ThreePointArc((-3.153862816, 2.650952535), (-3.298704863, 2.4683894), (-3.432992913, 2.27792881))
            Line((-3.432992913, 2.27792881), (-2.983575747, 1.839251328))
            Line((-2.983575747, 1.839251328), (-3.123969126, 1.589146495))
            Line((-3.123969126, 1.589146495), (-3.73251455, 1.744343755))
            ThreePointArc((-3.73251455, 1.744343755), (-3.825170408, 1.530513428), (-3.905587875, 1.31178632))
            Line((-3.905587875, 1.31178632), (-3.357946141, 1.004374133))
            Line((-3.357946141, 1.004374133), (-3.428823838, 0.726454935))
            Line((-3.428823838, 0.726454935), (-4.056801586, 0.718860831))
            ThreePointArc((-4.056801586, 0.718860831), (-4.090956911, 0.488335495), (-4.112023478, 0.256247761))
            Line((-4.112023478, 0.256247761), (-3.503478055, 0.1010505))
            Line((-3.503478055, 0.1010505), (-3.500009871, -0.185743328))
            Line((-3.500009871, -0.185743328), (-4.104624298, -0.35561127))
            ThreePointArc((-4.104624298, -0.35561127), (-4.077951461, -0.587121694), (-4.038231477, -0.81675366))
            Line((-4.038231477, -0.81675366), (-3.410253729, -0.809159557))
            Line((-3.410253729, -0.809159557), (-3.332676016, -1.085283491))
            Line((-3.332676016, -1.085283491), (-3.872723647, -1.405849051))
            ThreePointArc((-3.872723647, -1.405849051), (-3.787040358, -1.622567511), (-3.689240673, -1.834094669))
            Line((-3.689240673, -1.834094669), (-3.084626247, -1.664226727))
            Line((-3.084626247, -1.664226727), (-2.938225798, -1.910863377))
            Line((-2.938225798, -1.910863377), (-3.37690328, -2.360280543))
            ThreePointArc((-3.37690328, -2.360280543), (-3.238048713, -2.547438033), (-3.088834215, -2.726445157))
            Line((-3.088834215, -2.726445157), (-2.548786584, -2.405879596))
            Line((-2.548786584, -2.405879596), (-2.343540347, -2.606221081))
            Line((-2.343540347, -2.606221081), (-2.650952535, -3.153862816))
            ThreePointArc((-2.650952535, -3.153862816), (-2.4683894, -3.298704863), (-2.27792881, -3.432992913))
            Line((-2.27792881, -3.432992913), (-1.839251328, -2.983575747))
            Line((-1.839251328, -2.983575747), (-1.589146495, -3.123969126))
            Line((-1.589146495, -3.123969126), (-1.744343755, -3.73251455))
            ThreePointArc((-1.744343755, -3.73251455), (-1.530513428, -3.825170408), (-1.31178632, -3.905587875))
            Line((-1.31178632, -3.905587875), (-1.004374133, -3.357946141))
            Line((-1.004374133, -3.357946141), (-0.726454935, -3.428823838))
            Line((-0.726454935, -3.428823838), (-0.718860831, -4.056801586))
            ThreePointArc((-0.718860831, -4.056801586), (-0.488335495, -4.090956911), (-0.256247761, -4.112023478))
            Line((-0.256247761, -4.112023478), (-0.1010505, -3.503478055))
            Line((-0.1010505, -3.503478055), (0.185743328, -3.500009871))
            Line((0.185743328, -3.500009871), (0.35561127, -4.104624298))
            ThreePointArc((0.35561127, -4.104624298), (0.587121694, -4.077951461), (0.81675366, -4.038231477))
            Line((0.81675366, -4.038231477), (0.809159557, -3.410253729))
            Line((0.809159557, -3.410253729), (1.085283491, -3.332676016))
            Line((1.085283491, -3.332676016), (1.405849051, -3.872723647))
            ThreePointArc((1.405849051, -3.872723647), (1.622567511, -3.787040358), (1.834094669, -3.689240673))
            Line((1.834094669, -3.689240673), (1.664226727, -3.084626247))
            Line((1.664226727, -3.084626247), (1.910863377, -2.938225798))
            Line((1.910863377, -2.938225798), (2.360280543, -3.37690328))
            ThreePointArc((2.360280543, -3.37690328), (2.547438033, -3.238048713), (2.726445157, -3.088834215))
            Line((2.726445157, -3.088834215), (2.405879596, -2.548786584))
            Line((2.405879596, -2.548786584), (2.606221081, -2.343540347))
            Line((2.606221081, -2.343540347), (3.153862816, -2.650952535))
            ThreePointArc((3.153862816, -2.650952535), (3.298704863, -2.4683894), (3.432992913, -2.27792881))
            Line((3.432992913, -2.27792881), (2.983575747, -1.839251328))
            Line((2.983575747, -1.839251328), (3.123969126, -1.589146495))
            Line((3.123969126, -1.589146495), (3.73251455, -1.744343755))
            ThreePointArc((3.73251455, -1.744343755), (3.825170408, -1.530513428), (3.905587875, -1.31178632))
            Line((3.905587875, -1.31178632), (3.357946141, -1.004374133))
            Line((3.357946141, -1.004374133), (3.428823838, -0.726454935))
            Line((3.428823838, -0.726454935), (4.056801586, -0.718860831))
        make_face()
        Circle(CAVITY3_3_OUTLINE_R, mode=Mode.SUBTRACT)
    extrude(amount=CAVITY3_3_DEPTH, mode=Mode.SUBTRACT)

    # Cavity3 4 outline → Cavity3 4 (revolve, cut)
    with BuildSketch(Plane.XY):
        Polygon((2.8325, 3), (2.8325, 1.97), (5.665, 1.97), (4.635, 3), align=None)
    revolve(axis=Axis((0, 0, 0), (0, 1, 0)), mode=Mode.SUBTRACT)

    # Sketch3 → Cut-Extrude1 (cut)
    with BuildSketch(Plane.XZ.offset(3)):
        with Locations((23.945749158, -0.289574743)):
            Circle(SKETCH3_R)
        with Locations((18.796125683, -0.227300605)):
            Circle(SKETCH3_R)
        with Locations((13.646502208, -0.165026467)):
            Circle(SKETCH3_R)
        with Locations((8.496878733, -0.102752328)):
            Circle(SKETCH3_R)
        with Locations((0.102752328, 8.496878733)):
            Circle(SKETCH3_R)
        with Locations((0.165026467, 13.646502208)):
            Circle(SKETCH3_R)
        with Locations((0.227300605, 18.796125683)):
            Circle(SKETCH3_R)
        with Locations((0.289574743, 23.945749158)):
            Circle(SKETCH3_R)
        with Locations((-8.496878733, 0.102752328)):
            Circle(SKETCH3_R)
        with Locations((-13.646502208, 0.165026467)):
            Circle(SKETCH3_R)
        with Locations((-18.796125683, 0.227300605)):
            Circle(SKETCH3_R)
        with Locations((-23.945749158, 0.289574743)):
            Circle(SKETCH3_R)
        with Locations((-0.102752328, -8.496878733)):
            Circle(SKETCH3_R)
        with Locations((-0.165026467, -13.646502208)):
            Circle(SKETCH3_R)
        with Locations((-0.227300605, -18.796125683)):
            Circle(SKETCH3_R)
        with Locations((-0.289574743, -23.945749158)):
            Circle(SKETCH3_R)
        Circle(SKETCH3_R_2)
    extrude(amount=-CUT_EXTRUDE1_DEPTH, mode=Mode.SUBTRACT)

    # Sketch4 → Cut-Extrude2 (cut)
    with BuildSketch(Plane.XZ.offset(-1.97)):
        with Locations(Location((0, 0, 0), (0, 0, 359.307158785))):
            Circle(SKETCH4_R)
    extrude(amount=-CUT_EXTRUDE2_DEPTH, mode=Mode.SUBTRACT)

    # Sketch5 → Cut-Extrude3 (cut)
    with BuildSketch(Plane(origin=(0, 5, 0), x_dir=(1, 0, 0), z_dir=(0, 1, 0))):
        with Locations((25.25, 0)):
            Rectangle(SKETCH5_W, SKETCH5_H)
    extrude(amount=-CUT_EXTRUDE3_DEPTH, mode=Mode.SUBTRACT)

    # Sketch6 → Cut-Extrude4 (cut, through all)
    with BuildSketch(Plane.XZ.offset(3)):
        with Locations(Location((-28.81795203, -27.740325175, 0), (0, 0, 270))):
            Circle(SKETCH6_R)
    extrude(amount=-CUT_EXTRUDE4_DEPTH, mode=Mode.SUBTRACT)


solid = part.part
